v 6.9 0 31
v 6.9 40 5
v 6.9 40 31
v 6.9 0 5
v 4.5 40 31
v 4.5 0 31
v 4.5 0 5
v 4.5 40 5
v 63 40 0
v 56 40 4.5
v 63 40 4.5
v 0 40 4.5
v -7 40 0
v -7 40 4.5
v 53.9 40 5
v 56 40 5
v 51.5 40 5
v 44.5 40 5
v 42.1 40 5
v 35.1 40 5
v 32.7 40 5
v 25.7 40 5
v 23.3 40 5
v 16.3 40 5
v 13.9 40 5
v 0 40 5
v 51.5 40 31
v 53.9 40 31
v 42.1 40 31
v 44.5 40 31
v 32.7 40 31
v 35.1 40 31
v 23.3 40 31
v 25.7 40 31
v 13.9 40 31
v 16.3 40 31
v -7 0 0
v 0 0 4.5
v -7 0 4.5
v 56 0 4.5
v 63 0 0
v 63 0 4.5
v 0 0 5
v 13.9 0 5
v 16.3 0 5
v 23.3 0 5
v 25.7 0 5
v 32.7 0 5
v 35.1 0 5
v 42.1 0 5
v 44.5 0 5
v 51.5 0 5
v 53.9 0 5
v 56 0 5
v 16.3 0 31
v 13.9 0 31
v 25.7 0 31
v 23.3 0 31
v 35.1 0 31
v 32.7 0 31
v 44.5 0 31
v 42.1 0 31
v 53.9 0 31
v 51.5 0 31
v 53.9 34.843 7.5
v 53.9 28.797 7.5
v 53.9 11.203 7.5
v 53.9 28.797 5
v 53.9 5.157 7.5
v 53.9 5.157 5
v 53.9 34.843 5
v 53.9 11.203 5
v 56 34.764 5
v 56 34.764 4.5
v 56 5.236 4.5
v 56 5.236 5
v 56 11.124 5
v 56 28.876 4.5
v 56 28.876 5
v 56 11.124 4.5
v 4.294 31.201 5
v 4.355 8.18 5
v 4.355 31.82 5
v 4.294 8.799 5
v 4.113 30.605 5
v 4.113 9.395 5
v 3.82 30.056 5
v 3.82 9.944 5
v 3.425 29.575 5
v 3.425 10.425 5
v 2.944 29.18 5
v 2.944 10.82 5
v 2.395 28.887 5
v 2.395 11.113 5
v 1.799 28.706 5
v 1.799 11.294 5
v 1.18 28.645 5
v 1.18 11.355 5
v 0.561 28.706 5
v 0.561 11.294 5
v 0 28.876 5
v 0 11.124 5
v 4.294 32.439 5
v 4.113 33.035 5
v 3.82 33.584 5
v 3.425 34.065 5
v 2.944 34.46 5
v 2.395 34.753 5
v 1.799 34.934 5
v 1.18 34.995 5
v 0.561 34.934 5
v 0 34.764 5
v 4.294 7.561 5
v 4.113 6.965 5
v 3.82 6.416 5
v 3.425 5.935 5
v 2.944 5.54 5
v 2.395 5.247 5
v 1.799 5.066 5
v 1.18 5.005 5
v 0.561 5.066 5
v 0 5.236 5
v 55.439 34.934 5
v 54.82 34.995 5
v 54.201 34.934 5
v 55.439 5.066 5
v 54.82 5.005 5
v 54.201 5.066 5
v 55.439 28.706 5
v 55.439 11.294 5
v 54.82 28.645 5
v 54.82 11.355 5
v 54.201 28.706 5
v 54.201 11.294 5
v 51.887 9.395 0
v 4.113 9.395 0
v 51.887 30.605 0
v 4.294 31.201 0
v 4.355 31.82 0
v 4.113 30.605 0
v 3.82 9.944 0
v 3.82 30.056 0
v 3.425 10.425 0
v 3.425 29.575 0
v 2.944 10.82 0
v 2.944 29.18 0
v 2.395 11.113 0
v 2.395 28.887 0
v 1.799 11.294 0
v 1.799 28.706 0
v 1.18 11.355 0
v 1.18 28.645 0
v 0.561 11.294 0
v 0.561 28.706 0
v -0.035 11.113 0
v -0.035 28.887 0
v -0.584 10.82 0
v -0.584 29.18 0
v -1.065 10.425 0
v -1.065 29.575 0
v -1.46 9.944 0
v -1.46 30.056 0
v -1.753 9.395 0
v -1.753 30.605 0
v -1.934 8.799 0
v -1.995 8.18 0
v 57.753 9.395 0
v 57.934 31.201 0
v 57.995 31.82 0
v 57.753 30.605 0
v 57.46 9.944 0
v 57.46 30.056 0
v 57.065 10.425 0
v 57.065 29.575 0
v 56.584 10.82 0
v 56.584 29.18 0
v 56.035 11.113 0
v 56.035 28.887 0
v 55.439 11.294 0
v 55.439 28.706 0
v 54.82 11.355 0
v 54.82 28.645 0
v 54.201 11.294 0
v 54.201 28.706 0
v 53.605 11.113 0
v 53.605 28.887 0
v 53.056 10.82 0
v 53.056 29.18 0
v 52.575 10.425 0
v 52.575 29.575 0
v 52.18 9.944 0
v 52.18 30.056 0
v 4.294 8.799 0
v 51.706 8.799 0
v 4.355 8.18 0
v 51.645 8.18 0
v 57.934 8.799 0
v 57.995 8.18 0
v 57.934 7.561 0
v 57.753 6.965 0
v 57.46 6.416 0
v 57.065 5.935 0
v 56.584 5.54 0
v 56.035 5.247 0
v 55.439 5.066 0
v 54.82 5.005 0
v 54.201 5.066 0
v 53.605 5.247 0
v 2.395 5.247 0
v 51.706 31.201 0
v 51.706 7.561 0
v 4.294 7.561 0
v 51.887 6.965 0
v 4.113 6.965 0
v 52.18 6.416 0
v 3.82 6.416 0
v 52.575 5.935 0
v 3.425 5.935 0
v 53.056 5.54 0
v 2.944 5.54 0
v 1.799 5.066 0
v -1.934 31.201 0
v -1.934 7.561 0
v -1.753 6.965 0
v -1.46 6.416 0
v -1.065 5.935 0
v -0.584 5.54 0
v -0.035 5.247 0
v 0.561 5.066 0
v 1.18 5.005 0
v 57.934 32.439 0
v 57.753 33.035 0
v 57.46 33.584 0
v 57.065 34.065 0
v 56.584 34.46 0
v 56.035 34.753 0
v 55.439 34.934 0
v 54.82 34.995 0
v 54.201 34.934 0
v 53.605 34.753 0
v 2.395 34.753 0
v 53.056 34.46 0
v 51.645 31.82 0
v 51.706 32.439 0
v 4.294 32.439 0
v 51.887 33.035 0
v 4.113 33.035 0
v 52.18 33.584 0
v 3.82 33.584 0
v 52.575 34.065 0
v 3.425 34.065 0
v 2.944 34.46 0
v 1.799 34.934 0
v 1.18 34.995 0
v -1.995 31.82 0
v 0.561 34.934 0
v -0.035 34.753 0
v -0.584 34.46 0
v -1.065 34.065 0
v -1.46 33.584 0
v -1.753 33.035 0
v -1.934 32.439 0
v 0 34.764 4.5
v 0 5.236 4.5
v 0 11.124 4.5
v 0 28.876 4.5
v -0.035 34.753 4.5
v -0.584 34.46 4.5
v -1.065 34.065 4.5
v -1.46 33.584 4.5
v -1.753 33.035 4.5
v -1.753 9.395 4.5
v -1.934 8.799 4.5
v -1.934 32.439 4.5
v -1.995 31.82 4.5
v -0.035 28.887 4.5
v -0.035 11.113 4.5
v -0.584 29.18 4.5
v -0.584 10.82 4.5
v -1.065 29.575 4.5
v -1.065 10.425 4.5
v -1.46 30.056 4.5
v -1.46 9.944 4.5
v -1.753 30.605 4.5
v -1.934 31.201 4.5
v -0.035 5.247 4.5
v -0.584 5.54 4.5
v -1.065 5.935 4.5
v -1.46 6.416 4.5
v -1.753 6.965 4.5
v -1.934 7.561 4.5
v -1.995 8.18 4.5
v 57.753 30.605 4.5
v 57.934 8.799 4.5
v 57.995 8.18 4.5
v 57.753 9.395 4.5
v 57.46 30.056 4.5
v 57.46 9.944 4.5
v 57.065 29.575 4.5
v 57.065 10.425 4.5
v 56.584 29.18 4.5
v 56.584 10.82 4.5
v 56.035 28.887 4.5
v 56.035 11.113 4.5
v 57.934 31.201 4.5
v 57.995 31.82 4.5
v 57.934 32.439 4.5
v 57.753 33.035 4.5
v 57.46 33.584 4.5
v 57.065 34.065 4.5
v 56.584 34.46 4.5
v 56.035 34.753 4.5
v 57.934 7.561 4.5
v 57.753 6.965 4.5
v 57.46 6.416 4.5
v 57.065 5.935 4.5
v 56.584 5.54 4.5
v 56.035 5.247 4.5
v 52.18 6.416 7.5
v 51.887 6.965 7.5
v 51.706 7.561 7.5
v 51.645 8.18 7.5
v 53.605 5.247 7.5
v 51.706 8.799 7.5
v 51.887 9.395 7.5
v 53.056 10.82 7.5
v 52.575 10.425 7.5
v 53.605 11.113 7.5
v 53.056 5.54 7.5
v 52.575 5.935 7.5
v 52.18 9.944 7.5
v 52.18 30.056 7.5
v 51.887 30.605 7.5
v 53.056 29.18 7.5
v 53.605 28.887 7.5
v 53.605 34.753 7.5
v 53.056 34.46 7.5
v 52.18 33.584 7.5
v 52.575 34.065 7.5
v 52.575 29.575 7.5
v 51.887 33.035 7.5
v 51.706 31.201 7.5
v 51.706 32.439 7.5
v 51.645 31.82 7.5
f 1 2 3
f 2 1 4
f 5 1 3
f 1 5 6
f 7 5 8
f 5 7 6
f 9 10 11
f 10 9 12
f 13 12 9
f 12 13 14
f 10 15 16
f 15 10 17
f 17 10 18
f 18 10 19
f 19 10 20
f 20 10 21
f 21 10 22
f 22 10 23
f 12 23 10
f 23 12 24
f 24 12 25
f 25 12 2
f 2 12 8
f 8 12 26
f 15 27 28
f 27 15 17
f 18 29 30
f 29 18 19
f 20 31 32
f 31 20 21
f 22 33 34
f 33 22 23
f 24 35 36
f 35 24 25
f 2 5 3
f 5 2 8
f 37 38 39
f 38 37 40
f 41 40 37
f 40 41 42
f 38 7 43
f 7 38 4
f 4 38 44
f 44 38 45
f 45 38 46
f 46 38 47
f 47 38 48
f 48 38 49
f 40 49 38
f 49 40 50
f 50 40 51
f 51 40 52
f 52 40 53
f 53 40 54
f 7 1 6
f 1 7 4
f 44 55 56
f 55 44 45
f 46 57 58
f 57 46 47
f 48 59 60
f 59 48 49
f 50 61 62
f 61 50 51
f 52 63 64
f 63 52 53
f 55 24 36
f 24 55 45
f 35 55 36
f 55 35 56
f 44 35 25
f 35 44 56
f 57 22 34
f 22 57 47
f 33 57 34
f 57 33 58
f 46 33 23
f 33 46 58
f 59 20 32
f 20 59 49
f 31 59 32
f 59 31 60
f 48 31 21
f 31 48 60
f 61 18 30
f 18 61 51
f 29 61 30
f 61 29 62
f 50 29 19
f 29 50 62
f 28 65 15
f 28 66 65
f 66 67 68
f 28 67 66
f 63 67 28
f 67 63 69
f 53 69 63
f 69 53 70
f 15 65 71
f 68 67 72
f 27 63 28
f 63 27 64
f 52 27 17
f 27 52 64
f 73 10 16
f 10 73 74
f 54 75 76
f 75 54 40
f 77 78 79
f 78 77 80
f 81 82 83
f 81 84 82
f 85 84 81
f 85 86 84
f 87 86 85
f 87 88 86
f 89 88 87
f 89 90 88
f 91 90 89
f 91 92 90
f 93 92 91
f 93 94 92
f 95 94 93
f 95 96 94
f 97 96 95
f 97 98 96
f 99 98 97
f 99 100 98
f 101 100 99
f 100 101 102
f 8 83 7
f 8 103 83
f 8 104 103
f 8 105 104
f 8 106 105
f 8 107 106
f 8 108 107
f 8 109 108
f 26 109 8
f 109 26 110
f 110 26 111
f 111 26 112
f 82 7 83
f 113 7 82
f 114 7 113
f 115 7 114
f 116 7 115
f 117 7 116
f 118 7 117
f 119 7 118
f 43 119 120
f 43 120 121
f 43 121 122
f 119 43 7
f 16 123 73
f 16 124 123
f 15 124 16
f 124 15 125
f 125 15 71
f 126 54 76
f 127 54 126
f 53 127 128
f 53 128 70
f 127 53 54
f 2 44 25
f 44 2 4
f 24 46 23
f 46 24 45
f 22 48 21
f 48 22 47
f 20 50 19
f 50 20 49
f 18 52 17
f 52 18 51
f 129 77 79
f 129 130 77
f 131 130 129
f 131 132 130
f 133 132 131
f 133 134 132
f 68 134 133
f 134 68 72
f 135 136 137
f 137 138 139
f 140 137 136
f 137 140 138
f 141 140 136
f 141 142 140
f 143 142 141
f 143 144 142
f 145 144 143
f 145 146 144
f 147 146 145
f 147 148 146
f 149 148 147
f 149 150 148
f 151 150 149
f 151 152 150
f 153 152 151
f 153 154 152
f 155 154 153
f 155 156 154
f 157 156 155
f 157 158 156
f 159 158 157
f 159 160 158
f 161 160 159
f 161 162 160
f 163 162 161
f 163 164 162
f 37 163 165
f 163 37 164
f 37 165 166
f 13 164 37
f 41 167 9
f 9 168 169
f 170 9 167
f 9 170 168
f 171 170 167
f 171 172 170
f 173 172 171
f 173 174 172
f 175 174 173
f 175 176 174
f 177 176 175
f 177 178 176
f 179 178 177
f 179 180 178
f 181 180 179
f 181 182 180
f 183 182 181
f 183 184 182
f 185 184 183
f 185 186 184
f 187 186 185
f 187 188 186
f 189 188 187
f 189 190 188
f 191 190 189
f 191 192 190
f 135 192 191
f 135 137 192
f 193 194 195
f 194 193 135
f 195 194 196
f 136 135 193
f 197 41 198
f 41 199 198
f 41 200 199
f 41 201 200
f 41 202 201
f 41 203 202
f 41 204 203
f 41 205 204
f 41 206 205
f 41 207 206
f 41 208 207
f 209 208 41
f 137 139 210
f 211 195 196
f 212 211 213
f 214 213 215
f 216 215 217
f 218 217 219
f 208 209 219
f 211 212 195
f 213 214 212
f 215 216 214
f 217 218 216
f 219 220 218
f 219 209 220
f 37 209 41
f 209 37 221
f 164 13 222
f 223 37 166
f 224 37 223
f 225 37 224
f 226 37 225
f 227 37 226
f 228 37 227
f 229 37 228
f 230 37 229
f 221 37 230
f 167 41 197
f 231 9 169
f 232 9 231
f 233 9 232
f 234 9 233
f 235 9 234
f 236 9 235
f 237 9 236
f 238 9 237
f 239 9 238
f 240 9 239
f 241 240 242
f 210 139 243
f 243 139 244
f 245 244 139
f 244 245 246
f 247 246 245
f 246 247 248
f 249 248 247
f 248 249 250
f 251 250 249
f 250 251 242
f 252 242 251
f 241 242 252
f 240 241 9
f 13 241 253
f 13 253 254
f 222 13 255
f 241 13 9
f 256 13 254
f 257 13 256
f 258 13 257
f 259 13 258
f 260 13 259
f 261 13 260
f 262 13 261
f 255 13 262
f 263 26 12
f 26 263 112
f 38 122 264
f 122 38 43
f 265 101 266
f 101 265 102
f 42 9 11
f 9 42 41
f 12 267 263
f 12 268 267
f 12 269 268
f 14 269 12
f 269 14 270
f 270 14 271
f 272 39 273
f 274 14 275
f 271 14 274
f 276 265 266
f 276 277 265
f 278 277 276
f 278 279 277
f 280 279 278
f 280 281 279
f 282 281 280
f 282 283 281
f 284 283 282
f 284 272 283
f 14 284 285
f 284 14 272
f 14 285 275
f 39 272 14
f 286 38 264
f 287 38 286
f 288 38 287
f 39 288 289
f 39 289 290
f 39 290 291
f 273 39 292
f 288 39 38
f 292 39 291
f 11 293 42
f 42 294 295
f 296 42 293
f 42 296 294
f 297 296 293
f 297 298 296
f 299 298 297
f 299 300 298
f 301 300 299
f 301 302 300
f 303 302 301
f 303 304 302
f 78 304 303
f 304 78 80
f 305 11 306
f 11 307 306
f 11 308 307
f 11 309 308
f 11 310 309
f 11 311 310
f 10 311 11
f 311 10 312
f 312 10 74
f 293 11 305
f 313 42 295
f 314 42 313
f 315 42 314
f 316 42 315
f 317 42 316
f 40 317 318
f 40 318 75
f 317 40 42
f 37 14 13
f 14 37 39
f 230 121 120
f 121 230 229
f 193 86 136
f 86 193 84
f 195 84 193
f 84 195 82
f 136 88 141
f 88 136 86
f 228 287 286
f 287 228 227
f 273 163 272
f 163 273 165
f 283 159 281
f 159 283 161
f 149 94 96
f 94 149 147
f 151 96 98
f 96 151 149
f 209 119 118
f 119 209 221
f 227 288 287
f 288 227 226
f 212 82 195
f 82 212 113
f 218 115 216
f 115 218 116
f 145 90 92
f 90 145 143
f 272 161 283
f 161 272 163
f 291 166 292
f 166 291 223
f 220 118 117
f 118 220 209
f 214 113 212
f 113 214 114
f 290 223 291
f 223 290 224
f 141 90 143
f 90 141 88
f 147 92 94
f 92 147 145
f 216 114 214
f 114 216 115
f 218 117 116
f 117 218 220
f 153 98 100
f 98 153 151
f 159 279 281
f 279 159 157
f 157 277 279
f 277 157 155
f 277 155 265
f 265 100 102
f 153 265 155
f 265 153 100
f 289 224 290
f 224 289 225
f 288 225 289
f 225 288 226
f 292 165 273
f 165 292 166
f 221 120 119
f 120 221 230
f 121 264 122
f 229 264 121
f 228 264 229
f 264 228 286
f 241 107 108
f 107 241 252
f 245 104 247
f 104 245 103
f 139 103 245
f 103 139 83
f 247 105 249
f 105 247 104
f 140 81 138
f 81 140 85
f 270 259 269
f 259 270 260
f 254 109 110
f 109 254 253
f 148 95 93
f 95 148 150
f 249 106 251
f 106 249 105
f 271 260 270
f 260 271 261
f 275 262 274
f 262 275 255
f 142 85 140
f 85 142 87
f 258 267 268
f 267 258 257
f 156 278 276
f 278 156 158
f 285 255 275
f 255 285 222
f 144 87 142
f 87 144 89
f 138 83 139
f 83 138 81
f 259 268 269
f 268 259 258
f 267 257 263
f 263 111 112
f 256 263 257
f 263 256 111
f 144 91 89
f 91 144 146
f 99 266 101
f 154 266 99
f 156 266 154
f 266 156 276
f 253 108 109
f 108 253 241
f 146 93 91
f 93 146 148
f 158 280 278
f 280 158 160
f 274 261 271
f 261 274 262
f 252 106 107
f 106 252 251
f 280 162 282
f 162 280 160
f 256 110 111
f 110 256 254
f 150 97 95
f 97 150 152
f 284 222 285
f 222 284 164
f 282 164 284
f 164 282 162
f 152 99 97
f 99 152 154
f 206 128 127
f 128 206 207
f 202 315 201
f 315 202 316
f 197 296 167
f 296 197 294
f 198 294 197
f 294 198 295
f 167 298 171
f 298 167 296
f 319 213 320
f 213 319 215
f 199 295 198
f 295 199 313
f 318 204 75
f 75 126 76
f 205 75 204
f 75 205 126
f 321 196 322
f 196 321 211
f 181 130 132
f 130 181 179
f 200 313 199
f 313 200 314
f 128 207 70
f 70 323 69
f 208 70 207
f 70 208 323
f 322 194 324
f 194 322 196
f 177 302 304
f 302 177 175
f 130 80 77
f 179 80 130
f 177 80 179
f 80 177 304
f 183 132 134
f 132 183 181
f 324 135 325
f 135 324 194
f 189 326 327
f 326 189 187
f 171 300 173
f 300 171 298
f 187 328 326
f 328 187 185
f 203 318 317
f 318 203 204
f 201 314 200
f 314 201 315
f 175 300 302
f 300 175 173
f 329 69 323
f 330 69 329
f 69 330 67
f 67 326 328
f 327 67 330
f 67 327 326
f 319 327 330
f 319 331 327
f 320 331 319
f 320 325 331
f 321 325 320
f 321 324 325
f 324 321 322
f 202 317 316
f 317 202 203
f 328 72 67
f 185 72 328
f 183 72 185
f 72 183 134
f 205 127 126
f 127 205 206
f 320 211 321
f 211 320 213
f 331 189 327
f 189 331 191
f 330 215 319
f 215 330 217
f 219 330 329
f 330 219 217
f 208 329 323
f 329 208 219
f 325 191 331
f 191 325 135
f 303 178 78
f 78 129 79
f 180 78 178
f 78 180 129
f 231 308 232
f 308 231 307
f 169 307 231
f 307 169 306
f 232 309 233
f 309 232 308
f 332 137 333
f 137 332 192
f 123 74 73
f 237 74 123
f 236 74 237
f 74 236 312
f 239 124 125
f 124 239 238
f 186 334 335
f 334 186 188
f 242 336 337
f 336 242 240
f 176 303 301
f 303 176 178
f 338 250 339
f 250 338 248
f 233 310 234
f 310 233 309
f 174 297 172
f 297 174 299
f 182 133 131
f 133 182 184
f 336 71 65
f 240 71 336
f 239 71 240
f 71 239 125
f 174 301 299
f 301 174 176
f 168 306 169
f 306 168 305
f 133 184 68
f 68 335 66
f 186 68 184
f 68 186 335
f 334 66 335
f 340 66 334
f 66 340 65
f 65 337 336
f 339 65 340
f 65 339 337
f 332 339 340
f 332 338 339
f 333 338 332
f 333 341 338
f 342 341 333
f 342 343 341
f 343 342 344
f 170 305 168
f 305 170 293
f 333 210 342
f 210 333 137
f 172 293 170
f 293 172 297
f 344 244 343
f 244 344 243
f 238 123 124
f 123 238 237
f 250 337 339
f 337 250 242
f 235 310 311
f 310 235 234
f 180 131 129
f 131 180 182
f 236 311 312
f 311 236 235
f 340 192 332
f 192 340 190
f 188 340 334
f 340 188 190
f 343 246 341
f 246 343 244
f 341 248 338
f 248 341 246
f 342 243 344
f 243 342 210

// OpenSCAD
$fn = 32;

// ----------------------------------------------------------------------
// Finned heat sink: 56 x 40 mm base, 26 mm fins
// ----------------------------------------------------------------------

// --- parameters (mm) ---
base_w = 56;              // base width
base_d = 40;              // base depth
base_t = 5;               // base thickness
fin_h = 26;               // fin height above the base
holes_d = 6.35;           // fixing holes
hole_x = 26.82;           // hole offset in x
hole_y = 11.82;           // hole offset in y
fin_t = 2.4;              // fin thickness
fin_pitch = 9.4;          // fin pitch
fin_count = 6;            // number of fins
fin_x0 = 4.5;             // first fin offset
flange_w = 70;            // flange plate width
flange_t = 4;             // flange plate thickness

difference() {
  union() {
    cube([base_w, base_d, base_t]);
    for (i = [0 : fin_count - 1]) {
      translate([fin_x0 + i * fin_pitch, 0, base_t - 0.5]) cube([fin_t, base_d, fin_h + 0.5]);
    }
    /* mounting flange, a wider plate sharing the base bottom */
    translate([(base_w - flange_w) / 2, 0, 0]) cube([flange_w, base_d, flange_t + 0.5]);
  }
  /* fixing holes through the base, 2.5 mm clear on both sides */
  for (hx = [-26.82, 26.82]) {
    for (hy = [-11.82, 11.82]) {
      translate([base_w / 2 + hx, base_d / 2 + hy, -2.5]) cylinder(h = base_t + 5, d = holes_d);
    }
  }
}
